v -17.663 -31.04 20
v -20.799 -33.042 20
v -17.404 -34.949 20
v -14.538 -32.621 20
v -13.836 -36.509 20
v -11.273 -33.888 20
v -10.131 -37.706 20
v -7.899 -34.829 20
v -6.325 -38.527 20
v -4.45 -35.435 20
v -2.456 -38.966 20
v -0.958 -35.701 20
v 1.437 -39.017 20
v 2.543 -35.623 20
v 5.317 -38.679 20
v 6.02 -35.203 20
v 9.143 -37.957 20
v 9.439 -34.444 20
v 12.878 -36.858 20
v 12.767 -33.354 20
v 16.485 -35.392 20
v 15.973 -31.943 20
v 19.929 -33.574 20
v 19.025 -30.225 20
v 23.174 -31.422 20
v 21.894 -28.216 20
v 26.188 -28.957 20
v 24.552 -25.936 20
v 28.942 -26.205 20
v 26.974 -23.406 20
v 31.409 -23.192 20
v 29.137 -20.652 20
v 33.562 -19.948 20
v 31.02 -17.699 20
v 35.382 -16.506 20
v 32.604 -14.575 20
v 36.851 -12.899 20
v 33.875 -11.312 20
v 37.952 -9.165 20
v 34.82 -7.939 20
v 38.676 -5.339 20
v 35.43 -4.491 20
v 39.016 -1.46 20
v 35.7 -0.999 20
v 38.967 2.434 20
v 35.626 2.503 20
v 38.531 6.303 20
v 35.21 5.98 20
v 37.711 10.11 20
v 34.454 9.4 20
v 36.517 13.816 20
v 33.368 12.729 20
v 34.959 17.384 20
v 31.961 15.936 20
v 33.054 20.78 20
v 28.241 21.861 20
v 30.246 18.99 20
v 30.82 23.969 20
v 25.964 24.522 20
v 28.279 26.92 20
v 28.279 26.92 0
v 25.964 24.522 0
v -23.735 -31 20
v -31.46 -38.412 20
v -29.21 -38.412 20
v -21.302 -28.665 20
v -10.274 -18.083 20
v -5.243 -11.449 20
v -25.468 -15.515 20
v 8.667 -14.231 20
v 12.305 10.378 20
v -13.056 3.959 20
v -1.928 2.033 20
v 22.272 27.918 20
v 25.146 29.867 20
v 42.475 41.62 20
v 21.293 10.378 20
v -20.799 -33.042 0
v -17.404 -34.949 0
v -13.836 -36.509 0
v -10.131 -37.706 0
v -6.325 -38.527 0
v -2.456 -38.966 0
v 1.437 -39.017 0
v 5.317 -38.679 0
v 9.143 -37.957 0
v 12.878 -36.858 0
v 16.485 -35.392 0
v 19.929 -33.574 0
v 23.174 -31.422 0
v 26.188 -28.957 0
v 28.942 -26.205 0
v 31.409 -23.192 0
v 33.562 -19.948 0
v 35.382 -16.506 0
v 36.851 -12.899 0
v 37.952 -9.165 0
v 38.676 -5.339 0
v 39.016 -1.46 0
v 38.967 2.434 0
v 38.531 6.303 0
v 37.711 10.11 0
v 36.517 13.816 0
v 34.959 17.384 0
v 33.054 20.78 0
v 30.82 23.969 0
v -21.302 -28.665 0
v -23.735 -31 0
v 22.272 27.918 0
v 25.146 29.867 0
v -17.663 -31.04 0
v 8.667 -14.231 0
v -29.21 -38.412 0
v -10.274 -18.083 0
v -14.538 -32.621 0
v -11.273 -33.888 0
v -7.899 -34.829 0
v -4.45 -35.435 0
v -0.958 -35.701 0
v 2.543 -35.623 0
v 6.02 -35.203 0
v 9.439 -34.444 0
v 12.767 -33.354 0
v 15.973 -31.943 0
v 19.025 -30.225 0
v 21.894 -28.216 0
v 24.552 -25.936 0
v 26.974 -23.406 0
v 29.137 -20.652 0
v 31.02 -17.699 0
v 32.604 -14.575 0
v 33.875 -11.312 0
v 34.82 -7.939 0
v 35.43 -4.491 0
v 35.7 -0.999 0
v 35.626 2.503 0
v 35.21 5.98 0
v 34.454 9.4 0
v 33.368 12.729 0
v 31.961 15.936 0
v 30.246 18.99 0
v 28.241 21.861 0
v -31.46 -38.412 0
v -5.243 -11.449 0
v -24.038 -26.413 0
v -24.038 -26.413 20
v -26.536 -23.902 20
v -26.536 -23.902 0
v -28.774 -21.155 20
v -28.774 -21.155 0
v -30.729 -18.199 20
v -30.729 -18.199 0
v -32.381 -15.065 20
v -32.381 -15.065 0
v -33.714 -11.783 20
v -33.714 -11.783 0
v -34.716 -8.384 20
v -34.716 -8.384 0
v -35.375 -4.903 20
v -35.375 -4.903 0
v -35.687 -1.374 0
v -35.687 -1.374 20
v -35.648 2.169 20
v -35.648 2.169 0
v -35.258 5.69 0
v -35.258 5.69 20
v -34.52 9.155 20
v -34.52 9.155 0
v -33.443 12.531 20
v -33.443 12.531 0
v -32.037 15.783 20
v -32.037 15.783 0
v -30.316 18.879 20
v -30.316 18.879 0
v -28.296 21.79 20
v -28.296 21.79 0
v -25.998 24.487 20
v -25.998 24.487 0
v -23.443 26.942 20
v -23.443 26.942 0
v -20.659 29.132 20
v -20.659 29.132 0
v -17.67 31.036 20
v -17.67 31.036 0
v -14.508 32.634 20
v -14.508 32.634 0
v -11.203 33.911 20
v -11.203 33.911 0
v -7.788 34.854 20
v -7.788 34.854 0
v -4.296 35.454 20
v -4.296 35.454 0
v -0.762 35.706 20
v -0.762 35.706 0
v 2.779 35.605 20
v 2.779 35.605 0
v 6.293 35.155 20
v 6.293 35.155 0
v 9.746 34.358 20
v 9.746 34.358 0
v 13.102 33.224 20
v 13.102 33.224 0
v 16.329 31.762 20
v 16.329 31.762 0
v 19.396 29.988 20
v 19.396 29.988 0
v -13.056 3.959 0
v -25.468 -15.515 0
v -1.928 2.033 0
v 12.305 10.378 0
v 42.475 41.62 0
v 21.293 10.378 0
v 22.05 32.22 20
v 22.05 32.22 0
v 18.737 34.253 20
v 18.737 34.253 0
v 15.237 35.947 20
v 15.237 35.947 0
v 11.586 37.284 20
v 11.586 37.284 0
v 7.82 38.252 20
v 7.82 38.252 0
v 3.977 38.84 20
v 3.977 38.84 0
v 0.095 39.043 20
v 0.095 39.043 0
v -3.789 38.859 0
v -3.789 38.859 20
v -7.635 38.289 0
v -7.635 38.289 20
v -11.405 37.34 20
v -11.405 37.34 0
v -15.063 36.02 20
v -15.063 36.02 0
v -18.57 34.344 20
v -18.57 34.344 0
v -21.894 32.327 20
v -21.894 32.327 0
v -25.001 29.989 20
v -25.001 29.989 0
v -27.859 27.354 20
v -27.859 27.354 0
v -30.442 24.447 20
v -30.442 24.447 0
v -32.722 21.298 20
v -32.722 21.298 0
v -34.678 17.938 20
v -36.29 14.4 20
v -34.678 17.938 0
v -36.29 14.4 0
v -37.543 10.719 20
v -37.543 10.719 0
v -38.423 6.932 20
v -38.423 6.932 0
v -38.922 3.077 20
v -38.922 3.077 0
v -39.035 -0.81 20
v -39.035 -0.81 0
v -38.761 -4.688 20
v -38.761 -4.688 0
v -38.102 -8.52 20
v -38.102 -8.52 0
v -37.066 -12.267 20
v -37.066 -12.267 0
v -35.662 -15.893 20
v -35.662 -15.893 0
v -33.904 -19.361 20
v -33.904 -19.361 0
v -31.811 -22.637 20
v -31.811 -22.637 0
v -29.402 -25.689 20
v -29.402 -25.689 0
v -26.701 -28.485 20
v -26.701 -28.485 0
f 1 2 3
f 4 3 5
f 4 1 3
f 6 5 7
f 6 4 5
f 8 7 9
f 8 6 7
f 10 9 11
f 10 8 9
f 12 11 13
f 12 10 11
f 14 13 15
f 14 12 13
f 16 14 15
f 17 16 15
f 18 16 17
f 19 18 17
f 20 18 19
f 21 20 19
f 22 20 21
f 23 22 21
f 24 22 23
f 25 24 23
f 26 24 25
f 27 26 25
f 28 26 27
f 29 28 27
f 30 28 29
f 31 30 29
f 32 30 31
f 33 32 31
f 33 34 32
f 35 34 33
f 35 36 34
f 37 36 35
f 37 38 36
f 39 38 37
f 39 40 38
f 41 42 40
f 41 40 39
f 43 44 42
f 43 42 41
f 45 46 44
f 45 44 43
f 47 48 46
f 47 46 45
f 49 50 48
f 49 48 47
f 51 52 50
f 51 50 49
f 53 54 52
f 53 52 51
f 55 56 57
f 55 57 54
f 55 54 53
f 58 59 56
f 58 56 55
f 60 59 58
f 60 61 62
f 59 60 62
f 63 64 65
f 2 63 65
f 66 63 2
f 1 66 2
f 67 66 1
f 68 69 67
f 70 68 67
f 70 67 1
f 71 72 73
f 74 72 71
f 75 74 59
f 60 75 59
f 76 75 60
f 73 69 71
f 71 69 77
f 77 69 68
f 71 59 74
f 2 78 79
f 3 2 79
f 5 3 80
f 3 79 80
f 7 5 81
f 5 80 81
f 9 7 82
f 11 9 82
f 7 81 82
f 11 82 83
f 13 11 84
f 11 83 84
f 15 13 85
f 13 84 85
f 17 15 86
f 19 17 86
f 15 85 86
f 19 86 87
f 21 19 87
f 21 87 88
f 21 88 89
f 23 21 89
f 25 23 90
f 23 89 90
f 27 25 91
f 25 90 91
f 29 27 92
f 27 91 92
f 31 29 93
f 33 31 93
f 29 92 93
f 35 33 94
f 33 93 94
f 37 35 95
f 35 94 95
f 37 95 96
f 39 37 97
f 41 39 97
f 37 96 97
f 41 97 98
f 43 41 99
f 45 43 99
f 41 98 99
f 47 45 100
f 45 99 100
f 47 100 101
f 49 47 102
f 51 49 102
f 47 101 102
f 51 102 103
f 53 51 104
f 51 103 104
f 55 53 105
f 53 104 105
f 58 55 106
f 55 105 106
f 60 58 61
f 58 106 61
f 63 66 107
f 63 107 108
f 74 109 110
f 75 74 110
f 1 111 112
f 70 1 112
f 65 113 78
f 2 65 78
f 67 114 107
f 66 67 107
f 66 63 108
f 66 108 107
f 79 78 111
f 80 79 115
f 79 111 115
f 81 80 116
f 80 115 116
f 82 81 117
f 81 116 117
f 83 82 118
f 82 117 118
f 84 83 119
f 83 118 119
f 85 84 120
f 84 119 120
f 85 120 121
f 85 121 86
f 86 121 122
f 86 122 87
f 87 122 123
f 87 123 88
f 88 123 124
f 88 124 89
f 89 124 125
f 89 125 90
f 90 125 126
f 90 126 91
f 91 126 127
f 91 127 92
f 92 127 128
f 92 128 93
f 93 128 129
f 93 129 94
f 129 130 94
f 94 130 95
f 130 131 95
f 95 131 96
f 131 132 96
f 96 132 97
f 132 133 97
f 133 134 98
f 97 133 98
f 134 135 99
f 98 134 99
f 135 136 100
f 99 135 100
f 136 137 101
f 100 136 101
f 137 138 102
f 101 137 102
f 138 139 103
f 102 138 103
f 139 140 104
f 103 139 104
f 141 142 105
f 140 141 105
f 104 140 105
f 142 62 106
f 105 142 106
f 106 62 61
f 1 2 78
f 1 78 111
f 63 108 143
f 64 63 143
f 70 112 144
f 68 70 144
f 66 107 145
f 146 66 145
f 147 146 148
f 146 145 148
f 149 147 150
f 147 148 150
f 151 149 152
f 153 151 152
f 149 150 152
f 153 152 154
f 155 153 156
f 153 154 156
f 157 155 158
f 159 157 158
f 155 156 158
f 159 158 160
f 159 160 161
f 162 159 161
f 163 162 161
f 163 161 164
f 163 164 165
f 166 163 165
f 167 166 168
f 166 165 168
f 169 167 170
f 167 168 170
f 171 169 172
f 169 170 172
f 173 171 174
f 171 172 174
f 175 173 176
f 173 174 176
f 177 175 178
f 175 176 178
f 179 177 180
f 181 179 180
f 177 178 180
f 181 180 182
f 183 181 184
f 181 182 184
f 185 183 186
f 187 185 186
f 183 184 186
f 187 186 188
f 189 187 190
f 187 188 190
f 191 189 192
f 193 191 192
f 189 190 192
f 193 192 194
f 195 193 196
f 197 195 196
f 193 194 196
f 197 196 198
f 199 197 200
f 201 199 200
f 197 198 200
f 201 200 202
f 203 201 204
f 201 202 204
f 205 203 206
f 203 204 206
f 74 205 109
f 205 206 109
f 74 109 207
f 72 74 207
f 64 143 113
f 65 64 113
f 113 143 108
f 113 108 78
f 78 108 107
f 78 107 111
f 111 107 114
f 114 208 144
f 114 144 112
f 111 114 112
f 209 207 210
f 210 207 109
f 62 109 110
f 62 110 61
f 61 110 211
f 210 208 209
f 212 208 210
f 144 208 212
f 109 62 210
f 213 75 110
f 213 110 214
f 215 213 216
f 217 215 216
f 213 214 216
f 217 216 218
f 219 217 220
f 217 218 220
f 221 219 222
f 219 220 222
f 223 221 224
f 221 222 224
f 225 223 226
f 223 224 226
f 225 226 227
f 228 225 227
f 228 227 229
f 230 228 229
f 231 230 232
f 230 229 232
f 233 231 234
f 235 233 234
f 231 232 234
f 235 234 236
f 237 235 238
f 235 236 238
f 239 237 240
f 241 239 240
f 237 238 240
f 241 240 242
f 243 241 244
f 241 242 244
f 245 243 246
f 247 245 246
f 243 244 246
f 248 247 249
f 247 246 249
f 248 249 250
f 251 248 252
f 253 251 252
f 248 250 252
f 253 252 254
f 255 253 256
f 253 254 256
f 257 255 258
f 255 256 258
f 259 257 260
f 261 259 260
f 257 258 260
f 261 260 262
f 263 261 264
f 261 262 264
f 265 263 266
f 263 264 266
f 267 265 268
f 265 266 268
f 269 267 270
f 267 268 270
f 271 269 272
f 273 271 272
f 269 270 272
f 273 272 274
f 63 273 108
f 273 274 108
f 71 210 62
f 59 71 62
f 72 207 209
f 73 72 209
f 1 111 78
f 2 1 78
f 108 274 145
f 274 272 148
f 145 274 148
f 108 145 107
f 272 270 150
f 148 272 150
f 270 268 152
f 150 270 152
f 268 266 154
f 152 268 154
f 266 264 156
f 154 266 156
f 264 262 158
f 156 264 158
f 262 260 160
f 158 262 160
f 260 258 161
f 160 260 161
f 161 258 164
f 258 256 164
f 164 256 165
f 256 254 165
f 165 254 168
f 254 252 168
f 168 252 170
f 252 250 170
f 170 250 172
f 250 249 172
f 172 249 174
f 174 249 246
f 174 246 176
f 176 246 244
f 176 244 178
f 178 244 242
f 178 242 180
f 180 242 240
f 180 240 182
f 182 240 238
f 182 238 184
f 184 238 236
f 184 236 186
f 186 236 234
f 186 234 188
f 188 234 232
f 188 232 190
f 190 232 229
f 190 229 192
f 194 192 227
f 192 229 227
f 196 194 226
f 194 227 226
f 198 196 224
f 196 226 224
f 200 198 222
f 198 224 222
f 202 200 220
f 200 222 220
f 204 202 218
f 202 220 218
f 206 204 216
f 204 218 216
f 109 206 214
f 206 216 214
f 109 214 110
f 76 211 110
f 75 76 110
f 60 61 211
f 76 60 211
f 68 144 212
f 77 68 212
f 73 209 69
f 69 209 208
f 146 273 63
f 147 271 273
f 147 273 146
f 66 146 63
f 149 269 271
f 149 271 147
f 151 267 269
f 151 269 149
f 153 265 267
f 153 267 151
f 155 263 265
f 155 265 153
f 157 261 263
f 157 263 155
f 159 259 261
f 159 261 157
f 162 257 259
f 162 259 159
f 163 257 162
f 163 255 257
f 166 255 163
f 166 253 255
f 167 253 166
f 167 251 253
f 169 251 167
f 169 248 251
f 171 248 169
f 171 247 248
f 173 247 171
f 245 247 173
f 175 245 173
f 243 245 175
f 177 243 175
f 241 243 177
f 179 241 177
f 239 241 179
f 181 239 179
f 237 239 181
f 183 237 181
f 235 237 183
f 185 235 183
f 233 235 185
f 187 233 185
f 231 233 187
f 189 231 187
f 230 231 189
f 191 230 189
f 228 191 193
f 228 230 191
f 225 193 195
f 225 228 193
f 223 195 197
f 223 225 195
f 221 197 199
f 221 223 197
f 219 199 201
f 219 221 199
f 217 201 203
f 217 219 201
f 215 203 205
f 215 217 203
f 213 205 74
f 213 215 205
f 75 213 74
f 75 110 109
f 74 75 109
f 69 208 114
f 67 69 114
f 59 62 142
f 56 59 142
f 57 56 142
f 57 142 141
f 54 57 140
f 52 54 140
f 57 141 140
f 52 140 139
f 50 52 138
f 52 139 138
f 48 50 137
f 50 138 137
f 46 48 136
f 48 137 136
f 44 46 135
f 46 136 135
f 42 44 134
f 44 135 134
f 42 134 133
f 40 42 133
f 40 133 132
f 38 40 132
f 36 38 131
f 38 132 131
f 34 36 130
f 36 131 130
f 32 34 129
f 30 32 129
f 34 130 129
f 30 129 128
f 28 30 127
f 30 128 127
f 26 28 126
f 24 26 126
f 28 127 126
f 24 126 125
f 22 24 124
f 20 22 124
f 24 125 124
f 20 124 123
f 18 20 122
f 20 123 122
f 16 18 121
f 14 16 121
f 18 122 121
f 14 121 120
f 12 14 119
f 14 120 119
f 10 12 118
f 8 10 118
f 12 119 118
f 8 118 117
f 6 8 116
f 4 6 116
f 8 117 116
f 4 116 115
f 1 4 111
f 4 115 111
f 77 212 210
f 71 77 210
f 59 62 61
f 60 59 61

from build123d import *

# Parameters (mm, degrees)
F1_DEPTH = 20
F2_DEPTH = 20


with BuildPart() as f1:
    # F0 (on Top) → F1 (new body)
    with BuildSketch(Plane.XY):
        with BuildLine():
            ThreePointArc((-21.302294, -28.664973), (-28.295787, 21.790294), (22.271896, 27.918293))
            Line((22.271896, 27.918293), (25.145634, 29.867251))
            ThreePointArc((25.145634, 29.867251), (-30.441681, 24.447078), (-23.735405, -30.999777))
            Line((-23.735405, -30.999777), (-21.302294, -28.664973))
        make_face()
        with BuildLine():
            ThreePointArc((-20.798702, -33.041936), (30.213114, -24.728998), (28.278882, 26.919518))
            Line((28.278882, 26.919518), (25.963903, 24.52232))
            ThreePointArc((25.963903, 24.52232), (28.089515, -22.055557), (-17.663031, -31.040067))
            Line((-17.663031, -31.040067), (-20.798702, -33.041936))
        make_face()
    extrude(amount=F1_DEPTH)


with BuildPart() as f2:
    # F0 (on Top) → F2 (new body)
    with BuildSketch(Plane.XY):
        Polygon((25.145634, 29.867251), (22.271896, 27.918293), (-13.056217, 3.9589), (-1.928498, 2.032948), (-25.467901, -15.514607), (-10.274287, -18.08254), (-21.302294, -28.664973), (-23.735405, -30.999777), (-31.459749, -38.412027), (-29.21026, -38.412027), (-20.798702, -33.041936), (-17.663031, -31.040067), (8.666782, -14.230639), (-5.242868, -11.44871), (21.292834, 10.378377), (12.305062, 10.378377), (25.963903, 24.52232), (28.278882, 26.919518), (42.475397, 41.620232), align=None)
    extrude(amount=F2_DEPTH)


solid = Compound([f1.part, f2.part])
